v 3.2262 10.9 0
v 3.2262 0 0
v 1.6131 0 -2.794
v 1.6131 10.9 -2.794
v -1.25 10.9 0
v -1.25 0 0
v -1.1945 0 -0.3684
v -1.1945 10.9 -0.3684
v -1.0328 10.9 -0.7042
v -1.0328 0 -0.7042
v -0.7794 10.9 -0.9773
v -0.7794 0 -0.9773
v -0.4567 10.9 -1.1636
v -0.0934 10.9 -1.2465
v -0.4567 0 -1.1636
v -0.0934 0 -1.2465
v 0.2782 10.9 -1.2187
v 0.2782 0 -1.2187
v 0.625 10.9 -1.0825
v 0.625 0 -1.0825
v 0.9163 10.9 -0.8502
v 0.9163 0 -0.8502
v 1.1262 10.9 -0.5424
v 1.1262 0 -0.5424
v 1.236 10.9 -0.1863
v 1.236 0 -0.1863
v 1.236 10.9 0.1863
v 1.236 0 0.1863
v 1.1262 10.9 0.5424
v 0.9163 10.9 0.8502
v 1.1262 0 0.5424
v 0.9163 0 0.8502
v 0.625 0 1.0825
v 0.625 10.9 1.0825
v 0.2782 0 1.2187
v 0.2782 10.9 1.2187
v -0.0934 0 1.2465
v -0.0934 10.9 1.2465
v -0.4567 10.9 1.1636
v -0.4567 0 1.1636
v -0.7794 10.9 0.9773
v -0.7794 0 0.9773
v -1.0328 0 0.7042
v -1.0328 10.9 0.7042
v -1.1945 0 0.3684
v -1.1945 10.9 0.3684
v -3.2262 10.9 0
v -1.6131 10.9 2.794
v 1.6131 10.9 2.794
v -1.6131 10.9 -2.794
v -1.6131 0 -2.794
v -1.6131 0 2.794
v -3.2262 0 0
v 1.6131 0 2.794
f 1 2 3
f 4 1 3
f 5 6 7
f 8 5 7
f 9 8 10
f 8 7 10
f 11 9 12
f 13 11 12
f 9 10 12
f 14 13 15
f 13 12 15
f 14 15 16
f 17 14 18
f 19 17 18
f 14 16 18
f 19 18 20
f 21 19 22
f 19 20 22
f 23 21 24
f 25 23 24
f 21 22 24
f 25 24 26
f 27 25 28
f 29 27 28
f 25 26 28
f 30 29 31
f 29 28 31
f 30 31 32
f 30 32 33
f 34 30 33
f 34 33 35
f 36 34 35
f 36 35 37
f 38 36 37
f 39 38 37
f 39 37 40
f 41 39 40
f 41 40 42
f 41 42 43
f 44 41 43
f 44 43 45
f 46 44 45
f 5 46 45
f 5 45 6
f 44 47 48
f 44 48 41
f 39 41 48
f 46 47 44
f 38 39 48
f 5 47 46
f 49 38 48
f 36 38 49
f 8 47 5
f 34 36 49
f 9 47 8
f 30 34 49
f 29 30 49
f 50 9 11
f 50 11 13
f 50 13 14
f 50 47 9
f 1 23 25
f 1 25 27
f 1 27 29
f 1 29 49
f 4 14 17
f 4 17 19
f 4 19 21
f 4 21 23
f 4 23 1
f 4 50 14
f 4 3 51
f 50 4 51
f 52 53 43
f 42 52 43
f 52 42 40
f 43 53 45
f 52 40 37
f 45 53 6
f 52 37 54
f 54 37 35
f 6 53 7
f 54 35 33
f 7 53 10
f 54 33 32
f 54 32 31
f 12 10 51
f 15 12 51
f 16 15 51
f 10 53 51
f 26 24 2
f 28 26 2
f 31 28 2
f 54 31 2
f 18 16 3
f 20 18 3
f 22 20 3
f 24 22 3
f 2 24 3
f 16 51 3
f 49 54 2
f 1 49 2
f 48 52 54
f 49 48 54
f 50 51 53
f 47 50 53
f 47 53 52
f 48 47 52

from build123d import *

# Parameters (mm, degrees)
BOSS_EXTRUDE1_DEPTH       = 10.9
M3X0_5_TAPPED_HOLE1_D     = 2.5
M3X0_5_TAPPED_HOLE1_DEPTH = 20
M3X0_5_TAPPED_HOLE1_TIP   = 0.751075774


with BuildPart() as part:
    # Sketch1 → Boss-Extrude1 (new body)
    with BuildSketch(Plane(origin=(0, 0, 0), x_dir=(1, 0, 0), z_dir=(0, 1, 0))):
        Polygon((3.226233304, 0), (1.613116652, 2.794), (-1.613116652, 2.794), (-3.226233304, 0), (-1.613116652, -2.794), (1.613116652, -2.794), align=None)
    extrude(amount=BOSS_EXTRUDE1_DEPTH)

    # M3x0.5 Tapped Hole1
    with Locations(Plane(origin=(0, 10.9, 0), x_dir=(1, 0, 0), z_dir=(0, 1, 0))):
        with Locations((0, 0)):
            Hole(M3X0_5_TAPPED_HOLE1_D / 2, depth=M3X0_5_TAPPED_HOLE1_DEPTH)
            with Locations((0, 0, -(M3X0_5_TAPPED_HOLE1_DEPTH + M3X0_5_TAPPED_HOLE1_TIP / 2))):  # 118° drill point
                Cone(0, M3X0_5_TAPPED_HOLE1_D / 2, M3X0_5_TAPPED_HOLE1_TIP, mode=Mode.SUBTRACT)


solid = part.part
